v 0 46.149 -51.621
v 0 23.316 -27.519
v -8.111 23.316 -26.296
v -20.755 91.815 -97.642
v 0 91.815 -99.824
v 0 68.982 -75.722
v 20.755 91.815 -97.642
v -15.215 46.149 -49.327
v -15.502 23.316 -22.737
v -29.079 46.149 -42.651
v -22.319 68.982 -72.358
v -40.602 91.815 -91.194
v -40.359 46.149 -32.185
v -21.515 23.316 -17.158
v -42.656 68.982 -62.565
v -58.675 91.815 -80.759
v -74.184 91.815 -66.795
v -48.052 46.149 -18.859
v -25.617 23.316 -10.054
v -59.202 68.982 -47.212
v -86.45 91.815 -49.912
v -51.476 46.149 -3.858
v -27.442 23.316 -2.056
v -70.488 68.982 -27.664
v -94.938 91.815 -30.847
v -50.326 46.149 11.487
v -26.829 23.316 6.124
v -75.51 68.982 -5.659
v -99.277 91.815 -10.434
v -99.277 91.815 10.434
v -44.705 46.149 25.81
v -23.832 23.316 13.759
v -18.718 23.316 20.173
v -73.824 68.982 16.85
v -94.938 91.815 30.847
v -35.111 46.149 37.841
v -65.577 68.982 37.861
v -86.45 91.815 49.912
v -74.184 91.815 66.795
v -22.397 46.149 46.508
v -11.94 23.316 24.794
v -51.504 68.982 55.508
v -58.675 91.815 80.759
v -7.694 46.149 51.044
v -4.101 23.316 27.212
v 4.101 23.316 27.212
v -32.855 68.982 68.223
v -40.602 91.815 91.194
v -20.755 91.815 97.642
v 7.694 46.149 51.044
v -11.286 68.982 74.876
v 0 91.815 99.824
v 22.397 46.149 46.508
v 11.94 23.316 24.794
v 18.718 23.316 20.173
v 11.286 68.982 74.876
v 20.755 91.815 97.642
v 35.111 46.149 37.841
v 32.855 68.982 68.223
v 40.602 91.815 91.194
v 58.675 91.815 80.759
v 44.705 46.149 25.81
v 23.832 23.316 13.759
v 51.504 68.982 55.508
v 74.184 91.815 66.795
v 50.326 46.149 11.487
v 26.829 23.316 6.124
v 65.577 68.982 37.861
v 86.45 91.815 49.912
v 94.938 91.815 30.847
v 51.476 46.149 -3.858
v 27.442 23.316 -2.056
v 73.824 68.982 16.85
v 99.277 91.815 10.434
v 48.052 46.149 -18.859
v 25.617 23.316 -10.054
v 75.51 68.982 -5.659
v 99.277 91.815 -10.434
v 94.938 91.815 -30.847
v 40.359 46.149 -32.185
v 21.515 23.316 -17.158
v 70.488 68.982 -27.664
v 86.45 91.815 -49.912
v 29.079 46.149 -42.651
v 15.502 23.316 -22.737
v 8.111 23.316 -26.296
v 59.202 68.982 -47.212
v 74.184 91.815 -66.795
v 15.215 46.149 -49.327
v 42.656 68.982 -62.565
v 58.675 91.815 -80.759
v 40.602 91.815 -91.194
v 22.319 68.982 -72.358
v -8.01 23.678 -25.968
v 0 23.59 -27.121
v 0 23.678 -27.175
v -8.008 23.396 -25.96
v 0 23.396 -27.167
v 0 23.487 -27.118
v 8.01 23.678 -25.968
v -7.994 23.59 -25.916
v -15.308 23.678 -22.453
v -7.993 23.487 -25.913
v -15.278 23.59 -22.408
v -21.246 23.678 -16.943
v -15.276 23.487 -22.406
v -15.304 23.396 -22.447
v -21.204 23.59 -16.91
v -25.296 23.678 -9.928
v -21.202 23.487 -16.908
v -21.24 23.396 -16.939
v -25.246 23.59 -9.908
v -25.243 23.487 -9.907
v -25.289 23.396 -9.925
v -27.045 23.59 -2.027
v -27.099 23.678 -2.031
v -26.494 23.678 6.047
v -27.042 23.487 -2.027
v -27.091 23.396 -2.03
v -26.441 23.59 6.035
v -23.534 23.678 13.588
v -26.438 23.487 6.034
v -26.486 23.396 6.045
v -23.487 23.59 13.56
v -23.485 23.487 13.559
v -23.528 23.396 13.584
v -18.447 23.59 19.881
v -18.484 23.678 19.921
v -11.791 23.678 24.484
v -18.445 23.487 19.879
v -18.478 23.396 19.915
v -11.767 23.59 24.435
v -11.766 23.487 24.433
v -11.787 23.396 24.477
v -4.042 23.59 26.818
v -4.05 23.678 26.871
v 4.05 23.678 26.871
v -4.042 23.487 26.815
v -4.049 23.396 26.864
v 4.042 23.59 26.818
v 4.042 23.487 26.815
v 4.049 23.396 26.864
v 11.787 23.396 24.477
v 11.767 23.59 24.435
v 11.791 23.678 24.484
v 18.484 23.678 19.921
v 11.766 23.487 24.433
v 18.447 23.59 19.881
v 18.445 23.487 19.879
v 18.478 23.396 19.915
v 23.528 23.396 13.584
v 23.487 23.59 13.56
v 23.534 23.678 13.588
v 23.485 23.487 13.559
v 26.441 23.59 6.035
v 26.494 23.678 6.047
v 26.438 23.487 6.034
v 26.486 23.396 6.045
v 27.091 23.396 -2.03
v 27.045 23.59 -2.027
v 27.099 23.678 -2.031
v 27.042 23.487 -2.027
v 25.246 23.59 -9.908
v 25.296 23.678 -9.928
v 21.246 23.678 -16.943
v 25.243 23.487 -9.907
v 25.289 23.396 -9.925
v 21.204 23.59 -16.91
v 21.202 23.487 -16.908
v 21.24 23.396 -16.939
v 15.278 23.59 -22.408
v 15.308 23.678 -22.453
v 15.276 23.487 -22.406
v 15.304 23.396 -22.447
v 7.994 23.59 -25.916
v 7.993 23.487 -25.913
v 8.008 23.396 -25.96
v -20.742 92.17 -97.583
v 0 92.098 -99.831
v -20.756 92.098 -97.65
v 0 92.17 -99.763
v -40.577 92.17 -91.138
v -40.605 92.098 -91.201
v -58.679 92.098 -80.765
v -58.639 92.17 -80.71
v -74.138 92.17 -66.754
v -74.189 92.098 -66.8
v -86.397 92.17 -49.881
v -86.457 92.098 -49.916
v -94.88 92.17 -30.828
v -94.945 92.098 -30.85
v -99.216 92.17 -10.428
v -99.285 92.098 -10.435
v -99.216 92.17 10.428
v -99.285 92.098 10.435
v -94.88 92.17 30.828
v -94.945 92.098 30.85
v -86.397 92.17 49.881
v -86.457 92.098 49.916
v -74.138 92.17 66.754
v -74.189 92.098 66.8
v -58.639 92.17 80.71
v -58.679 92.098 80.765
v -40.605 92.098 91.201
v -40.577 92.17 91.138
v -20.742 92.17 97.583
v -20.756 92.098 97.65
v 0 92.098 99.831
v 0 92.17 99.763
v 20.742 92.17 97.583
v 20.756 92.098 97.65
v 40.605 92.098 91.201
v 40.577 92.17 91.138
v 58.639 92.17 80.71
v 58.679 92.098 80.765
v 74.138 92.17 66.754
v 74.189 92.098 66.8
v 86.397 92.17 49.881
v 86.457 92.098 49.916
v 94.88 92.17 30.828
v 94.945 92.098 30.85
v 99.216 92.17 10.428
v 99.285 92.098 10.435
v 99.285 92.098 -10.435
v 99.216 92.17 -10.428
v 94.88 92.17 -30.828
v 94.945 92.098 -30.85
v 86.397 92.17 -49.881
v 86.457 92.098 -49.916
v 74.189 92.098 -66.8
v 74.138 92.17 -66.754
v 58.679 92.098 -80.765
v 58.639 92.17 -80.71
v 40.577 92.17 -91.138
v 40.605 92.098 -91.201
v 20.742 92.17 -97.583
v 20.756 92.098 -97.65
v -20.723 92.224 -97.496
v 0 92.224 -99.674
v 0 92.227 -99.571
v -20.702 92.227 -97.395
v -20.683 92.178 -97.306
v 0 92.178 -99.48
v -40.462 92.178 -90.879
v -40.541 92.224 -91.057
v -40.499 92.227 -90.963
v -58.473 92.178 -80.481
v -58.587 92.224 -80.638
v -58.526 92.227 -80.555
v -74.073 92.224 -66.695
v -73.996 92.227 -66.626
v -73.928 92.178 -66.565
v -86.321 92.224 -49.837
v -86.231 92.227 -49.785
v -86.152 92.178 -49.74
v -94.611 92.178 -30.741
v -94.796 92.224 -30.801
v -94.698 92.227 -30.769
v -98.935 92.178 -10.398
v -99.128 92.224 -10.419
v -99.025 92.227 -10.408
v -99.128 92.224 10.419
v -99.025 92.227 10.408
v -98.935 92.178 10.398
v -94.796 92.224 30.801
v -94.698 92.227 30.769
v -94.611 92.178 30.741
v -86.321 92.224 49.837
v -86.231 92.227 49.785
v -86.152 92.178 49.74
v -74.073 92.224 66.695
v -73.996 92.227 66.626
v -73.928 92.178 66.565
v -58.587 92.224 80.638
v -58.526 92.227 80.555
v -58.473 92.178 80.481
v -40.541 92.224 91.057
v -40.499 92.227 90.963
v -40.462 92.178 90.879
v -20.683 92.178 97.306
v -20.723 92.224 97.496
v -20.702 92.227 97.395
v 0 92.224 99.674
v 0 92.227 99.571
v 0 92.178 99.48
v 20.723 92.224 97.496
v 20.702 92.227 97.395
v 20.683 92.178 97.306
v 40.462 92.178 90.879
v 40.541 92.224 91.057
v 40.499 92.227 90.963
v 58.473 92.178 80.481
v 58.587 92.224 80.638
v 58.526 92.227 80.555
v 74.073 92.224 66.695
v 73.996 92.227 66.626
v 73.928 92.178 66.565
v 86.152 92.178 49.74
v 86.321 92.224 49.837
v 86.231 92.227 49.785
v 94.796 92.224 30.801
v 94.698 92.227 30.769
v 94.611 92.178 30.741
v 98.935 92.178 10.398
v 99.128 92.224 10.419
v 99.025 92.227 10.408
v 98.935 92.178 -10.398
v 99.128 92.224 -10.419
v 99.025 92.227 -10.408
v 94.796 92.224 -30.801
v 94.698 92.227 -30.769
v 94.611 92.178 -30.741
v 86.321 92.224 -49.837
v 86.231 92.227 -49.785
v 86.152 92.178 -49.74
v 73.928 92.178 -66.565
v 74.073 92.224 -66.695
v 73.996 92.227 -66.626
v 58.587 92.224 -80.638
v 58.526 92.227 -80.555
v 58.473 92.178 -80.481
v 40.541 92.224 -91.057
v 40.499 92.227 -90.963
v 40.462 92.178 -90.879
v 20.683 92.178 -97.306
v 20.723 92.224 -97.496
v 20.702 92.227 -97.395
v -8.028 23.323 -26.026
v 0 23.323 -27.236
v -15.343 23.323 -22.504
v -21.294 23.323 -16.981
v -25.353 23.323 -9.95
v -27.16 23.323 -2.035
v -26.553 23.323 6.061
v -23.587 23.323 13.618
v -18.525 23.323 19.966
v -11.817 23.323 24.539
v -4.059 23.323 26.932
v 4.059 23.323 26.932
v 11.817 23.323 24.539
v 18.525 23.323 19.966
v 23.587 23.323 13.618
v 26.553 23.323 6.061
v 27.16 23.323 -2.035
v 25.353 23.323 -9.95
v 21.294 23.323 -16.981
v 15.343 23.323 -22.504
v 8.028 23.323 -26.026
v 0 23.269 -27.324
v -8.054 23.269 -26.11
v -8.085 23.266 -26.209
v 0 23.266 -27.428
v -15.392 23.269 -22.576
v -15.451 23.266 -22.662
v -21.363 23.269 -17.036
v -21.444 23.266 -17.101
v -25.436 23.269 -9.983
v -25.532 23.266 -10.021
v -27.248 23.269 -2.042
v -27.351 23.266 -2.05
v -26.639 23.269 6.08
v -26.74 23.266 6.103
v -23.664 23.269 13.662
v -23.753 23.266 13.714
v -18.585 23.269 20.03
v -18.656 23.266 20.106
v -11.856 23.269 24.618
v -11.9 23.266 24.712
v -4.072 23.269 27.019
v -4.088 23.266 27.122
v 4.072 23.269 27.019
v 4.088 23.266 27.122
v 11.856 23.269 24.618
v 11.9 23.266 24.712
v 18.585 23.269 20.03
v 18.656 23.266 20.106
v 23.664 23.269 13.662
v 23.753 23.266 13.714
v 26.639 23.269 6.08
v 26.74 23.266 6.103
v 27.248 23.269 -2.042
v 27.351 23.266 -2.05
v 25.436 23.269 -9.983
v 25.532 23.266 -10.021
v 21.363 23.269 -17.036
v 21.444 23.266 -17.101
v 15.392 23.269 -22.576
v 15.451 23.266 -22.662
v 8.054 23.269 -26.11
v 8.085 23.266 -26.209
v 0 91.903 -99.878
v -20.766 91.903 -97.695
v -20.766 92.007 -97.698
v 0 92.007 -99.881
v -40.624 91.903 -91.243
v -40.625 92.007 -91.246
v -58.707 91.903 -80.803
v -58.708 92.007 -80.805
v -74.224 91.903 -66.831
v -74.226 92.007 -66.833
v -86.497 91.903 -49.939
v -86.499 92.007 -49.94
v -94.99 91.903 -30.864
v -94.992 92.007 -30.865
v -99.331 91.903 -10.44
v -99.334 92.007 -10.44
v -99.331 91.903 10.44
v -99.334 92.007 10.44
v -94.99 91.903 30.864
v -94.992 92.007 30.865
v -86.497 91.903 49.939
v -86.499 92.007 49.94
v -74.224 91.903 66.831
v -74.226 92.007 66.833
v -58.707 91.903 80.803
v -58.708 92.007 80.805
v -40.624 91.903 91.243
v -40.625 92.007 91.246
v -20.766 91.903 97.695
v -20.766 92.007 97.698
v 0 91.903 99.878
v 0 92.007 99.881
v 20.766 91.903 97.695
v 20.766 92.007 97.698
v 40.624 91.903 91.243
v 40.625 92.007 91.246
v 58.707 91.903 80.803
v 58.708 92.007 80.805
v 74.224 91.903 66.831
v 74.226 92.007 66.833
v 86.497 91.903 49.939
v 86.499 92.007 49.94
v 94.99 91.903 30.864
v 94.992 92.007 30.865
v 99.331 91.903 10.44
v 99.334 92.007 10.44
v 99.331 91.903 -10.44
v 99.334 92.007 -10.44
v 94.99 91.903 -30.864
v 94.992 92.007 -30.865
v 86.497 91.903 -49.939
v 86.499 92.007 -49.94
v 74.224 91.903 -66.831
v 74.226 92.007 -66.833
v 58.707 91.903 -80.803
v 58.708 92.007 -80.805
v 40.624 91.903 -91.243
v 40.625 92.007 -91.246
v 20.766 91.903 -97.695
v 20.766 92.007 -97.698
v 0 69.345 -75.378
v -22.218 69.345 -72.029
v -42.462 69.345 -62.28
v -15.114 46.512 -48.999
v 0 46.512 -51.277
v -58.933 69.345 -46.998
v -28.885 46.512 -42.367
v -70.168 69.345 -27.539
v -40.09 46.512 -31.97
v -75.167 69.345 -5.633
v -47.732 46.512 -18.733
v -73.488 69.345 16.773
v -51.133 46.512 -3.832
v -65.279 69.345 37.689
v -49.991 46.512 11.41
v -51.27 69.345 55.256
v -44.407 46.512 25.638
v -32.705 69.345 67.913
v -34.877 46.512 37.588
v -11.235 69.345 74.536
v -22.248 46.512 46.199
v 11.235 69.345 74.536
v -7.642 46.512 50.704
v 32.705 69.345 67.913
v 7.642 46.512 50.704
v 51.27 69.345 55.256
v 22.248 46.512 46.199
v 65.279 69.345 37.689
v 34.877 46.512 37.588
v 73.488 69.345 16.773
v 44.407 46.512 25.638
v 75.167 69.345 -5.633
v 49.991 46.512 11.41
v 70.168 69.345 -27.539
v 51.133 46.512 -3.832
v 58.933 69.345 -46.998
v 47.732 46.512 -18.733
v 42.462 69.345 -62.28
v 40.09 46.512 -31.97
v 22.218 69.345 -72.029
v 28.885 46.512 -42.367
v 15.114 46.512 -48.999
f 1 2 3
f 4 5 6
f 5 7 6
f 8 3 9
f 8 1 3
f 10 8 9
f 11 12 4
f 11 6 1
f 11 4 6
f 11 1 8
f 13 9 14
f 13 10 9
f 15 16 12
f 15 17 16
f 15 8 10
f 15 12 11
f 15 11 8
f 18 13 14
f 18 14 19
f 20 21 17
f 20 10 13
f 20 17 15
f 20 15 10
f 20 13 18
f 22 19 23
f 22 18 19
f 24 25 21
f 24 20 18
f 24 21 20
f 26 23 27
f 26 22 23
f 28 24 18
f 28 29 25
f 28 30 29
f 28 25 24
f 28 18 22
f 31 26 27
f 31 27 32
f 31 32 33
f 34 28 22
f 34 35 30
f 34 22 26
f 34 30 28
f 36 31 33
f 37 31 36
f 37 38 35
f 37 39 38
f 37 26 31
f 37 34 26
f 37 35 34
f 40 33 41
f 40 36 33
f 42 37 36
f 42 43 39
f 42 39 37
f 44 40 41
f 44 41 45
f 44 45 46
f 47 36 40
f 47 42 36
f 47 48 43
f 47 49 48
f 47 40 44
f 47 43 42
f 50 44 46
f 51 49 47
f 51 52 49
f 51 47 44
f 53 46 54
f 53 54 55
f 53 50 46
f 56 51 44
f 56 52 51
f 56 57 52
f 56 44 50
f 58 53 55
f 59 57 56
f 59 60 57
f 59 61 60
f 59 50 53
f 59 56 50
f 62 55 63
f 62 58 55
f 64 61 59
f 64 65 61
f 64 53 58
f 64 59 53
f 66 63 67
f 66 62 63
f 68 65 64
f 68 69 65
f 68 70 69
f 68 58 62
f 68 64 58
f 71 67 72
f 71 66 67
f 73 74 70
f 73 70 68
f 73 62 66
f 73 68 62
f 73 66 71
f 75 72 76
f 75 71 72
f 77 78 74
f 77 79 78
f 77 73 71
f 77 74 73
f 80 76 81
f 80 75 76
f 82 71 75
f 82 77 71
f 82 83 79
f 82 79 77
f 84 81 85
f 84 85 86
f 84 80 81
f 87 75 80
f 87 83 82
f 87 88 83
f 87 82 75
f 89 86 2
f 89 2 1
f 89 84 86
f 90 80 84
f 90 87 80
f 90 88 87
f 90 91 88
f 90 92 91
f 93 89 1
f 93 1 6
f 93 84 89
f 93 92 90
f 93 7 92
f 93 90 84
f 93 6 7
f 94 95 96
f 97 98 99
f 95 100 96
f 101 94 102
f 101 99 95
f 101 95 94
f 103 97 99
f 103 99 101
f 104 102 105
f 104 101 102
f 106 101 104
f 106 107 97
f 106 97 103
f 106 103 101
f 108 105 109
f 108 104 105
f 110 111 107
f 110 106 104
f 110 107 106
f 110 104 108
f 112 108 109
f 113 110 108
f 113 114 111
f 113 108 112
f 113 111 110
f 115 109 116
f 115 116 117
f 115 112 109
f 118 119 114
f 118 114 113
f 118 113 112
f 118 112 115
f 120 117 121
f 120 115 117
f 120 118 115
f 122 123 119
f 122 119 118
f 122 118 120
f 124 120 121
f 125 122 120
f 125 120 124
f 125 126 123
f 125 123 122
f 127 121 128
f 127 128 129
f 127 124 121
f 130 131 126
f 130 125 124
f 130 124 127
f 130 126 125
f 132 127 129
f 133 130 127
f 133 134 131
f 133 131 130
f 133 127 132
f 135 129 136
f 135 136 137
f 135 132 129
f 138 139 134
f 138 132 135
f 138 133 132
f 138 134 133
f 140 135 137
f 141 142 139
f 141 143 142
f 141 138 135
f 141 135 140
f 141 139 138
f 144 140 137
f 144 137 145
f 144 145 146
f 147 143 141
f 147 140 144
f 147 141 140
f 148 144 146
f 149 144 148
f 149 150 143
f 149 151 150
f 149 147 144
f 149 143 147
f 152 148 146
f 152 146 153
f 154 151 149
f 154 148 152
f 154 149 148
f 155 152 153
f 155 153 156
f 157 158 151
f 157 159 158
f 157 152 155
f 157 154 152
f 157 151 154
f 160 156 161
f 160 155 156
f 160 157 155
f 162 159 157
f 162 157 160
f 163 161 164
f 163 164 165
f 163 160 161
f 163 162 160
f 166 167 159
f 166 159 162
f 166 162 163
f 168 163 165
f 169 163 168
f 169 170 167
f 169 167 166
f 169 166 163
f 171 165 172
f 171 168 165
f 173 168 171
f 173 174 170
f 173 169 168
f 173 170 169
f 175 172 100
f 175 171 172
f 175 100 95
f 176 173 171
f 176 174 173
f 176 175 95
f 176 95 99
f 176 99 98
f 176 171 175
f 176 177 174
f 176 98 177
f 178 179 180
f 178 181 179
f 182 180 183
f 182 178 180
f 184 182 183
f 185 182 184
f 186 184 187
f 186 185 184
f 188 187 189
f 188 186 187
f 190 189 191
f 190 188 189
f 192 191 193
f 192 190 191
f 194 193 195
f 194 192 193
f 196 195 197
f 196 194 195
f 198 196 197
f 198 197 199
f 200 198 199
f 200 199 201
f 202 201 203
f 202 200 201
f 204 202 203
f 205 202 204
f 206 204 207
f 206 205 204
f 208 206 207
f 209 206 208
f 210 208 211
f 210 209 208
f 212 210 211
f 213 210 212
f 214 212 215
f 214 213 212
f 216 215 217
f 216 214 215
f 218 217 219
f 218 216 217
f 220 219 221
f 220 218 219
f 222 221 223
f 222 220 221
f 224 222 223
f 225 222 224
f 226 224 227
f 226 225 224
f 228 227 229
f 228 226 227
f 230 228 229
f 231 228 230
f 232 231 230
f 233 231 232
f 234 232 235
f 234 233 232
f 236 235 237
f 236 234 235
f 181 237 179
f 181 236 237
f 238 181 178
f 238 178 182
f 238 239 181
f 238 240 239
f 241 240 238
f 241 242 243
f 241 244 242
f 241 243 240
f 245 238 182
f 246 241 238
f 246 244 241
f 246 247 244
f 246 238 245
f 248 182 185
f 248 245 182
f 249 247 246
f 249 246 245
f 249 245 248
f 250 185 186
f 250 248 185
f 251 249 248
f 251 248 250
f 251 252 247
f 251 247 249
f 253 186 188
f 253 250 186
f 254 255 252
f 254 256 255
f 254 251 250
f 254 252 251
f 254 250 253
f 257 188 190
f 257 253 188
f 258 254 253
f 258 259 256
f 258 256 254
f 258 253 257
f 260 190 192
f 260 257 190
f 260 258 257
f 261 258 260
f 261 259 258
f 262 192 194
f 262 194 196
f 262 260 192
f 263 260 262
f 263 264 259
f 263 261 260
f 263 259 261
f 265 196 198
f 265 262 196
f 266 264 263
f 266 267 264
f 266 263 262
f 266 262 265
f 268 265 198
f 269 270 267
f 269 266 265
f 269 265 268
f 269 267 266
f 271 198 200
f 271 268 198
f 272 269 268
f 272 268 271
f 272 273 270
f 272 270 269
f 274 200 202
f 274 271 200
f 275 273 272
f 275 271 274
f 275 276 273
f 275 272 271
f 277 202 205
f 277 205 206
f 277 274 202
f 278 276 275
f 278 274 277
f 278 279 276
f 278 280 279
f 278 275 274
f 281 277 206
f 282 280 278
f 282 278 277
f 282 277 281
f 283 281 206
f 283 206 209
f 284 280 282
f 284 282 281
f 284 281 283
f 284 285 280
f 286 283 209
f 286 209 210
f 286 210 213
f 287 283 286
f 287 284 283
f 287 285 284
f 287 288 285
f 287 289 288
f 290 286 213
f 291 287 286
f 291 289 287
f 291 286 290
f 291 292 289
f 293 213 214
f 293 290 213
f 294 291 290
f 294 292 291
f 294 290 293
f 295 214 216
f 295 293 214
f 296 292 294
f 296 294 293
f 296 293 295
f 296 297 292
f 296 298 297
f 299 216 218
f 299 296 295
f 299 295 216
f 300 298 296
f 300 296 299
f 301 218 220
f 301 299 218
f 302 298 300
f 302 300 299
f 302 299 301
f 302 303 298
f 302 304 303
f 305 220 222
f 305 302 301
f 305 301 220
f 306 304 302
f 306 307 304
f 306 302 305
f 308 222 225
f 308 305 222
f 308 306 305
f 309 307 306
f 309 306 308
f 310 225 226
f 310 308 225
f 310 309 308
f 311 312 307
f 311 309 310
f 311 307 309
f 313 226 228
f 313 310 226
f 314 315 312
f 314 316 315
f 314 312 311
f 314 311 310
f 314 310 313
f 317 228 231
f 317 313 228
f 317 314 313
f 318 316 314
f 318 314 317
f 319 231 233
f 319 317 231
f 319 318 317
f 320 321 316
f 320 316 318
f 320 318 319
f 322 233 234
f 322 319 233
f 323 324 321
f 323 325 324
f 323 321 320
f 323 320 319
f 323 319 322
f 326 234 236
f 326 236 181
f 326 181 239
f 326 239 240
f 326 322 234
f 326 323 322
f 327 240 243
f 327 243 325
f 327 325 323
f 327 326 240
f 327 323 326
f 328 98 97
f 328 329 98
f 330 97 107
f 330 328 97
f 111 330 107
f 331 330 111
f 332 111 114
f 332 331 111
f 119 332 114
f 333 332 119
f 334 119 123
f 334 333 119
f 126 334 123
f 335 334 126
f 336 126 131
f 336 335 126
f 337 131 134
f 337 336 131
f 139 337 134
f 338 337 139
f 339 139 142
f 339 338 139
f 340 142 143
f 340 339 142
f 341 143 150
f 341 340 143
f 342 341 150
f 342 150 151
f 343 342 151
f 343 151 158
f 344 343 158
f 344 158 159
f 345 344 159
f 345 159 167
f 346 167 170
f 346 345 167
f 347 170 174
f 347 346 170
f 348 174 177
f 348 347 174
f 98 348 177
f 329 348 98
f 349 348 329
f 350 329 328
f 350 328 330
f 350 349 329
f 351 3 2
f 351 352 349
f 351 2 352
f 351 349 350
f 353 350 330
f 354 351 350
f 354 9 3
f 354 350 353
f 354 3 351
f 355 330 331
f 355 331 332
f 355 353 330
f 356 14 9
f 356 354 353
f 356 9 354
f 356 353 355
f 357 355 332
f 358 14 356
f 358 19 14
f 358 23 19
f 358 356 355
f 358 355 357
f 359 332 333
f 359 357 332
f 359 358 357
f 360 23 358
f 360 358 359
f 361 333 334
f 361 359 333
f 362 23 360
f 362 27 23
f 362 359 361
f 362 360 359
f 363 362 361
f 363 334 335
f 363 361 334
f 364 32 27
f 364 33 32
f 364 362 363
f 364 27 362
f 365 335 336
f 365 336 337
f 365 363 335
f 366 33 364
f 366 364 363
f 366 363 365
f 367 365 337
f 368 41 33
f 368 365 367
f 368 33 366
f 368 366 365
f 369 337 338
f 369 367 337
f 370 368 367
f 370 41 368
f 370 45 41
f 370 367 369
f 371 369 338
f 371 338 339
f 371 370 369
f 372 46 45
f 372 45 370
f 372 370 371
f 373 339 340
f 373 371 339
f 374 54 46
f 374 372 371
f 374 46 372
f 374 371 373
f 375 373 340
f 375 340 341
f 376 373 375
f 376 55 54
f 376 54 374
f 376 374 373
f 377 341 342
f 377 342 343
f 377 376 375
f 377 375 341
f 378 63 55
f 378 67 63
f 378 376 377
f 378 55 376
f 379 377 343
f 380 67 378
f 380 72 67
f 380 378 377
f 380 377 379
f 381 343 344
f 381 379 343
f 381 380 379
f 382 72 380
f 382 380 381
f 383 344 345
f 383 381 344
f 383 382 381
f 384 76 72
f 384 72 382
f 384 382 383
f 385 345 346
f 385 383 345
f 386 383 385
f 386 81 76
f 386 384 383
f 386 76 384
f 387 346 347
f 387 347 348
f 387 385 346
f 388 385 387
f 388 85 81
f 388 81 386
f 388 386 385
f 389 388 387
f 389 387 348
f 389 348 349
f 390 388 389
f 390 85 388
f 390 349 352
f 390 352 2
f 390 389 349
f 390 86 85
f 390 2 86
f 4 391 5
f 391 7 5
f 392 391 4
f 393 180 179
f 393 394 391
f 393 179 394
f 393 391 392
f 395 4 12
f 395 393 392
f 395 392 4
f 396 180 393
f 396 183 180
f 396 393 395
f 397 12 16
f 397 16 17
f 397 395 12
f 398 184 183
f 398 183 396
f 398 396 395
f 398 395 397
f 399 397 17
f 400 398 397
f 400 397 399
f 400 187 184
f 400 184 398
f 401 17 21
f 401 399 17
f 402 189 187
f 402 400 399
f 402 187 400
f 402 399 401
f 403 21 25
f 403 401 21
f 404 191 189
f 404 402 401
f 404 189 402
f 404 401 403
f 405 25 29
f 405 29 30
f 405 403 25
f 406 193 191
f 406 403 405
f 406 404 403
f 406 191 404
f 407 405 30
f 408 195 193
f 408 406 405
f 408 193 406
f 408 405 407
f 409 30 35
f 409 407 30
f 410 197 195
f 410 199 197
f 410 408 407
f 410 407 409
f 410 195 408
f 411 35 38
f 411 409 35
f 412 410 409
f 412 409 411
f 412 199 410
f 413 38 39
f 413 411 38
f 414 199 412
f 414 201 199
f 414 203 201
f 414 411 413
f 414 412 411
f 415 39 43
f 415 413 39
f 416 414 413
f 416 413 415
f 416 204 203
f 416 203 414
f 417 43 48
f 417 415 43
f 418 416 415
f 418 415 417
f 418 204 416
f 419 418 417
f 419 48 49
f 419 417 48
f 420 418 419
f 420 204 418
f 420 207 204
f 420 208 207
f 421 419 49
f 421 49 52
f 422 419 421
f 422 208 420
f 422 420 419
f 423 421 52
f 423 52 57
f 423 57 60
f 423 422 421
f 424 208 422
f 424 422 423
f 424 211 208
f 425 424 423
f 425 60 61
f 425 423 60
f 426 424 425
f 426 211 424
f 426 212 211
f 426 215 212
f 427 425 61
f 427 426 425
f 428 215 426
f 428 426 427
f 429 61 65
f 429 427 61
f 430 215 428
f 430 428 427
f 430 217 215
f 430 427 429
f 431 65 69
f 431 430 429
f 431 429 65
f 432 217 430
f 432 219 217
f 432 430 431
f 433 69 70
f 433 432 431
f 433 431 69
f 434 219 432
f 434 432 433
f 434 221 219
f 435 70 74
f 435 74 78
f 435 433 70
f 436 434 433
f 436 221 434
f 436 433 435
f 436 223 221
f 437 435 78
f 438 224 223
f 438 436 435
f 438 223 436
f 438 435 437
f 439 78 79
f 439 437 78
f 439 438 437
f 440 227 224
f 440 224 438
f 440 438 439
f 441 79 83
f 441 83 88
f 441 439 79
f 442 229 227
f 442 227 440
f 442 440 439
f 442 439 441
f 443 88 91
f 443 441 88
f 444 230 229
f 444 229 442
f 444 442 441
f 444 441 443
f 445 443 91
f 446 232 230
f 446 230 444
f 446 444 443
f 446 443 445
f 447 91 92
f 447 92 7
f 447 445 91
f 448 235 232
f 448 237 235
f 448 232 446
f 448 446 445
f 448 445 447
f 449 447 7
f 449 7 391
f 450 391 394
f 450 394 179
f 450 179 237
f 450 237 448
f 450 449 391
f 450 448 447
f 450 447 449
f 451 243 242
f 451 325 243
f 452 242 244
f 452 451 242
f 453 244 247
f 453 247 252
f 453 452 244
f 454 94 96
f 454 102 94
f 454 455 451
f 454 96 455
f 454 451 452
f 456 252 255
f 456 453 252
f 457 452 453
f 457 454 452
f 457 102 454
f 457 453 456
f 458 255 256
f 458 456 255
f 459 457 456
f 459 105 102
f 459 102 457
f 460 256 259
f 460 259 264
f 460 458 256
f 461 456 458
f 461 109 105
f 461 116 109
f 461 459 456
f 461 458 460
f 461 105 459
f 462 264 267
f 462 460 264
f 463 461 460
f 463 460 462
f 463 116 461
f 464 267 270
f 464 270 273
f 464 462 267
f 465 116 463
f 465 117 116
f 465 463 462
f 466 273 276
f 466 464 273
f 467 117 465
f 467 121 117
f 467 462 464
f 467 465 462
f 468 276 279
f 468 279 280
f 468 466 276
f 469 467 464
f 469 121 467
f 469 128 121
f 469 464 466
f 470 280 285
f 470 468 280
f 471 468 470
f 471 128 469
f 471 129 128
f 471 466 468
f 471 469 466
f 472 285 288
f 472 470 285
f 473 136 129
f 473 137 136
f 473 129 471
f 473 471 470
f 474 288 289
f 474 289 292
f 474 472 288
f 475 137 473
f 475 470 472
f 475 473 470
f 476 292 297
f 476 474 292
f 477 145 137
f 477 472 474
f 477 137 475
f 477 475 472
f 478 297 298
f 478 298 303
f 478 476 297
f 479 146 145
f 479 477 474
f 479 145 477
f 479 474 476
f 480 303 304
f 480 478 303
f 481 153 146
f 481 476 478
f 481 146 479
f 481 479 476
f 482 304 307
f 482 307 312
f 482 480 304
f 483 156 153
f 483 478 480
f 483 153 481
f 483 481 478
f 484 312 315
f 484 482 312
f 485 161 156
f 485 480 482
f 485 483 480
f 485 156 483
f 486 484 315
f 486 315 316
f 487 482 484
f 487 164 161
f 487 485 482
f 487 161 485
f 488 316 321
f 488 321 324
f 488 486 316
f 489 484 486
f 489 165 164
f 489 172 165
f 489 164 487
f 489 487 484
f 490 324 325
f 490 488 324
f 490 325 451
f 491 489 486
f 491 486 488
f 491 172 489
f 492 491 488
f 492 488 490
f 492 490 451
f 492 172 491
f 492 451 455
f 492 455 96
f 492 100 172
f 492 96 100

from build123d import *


with BuildPart() as part:
    # Эскиз2 → Повернуть1 (revolve)
    with BuildSketch(Plane.XY, mode=Mode.PRIVATE) as revolve_1_sk:
        with BuildLine():
            Line((99.47989222, 92.177858052), (27.175004903, 23.67849112))
            ThreePointArc((27.175004903, 23.67849112), (27.112626839, 23.538704015), (27.167363296, 23.395751653))
            Line((27.167363296, 23.395751653), (27.236137761, 23.323156385))
            ThreePointArc((27.236137761, 23.323156385), (27.375924866, 23.260778321), (27.518877227, 23.315514778))
            Line((27.518877227, 23.315514778), (99.823764544, 91.81488171))
            ThreePointArc((99.823764544, 91.81488171), (99.886142609, 91.954668814), (99.831406152, 92.097621176))
            Line((99.831406152, 92.097621176), (99.762631687, 92.170216445))
            ThreePointArc((99.762631687, 92.170216445), (99.622844582, 92.232594509), (99.47989222, 92.177858052))
        make_face()
    revolve(revolve_1_sk.sketch.rotate(Axis((0, -32.617744242, 0), (0, 1, 0)), 90), axis=Axis((0, -32.617744242, 0), (0, 1, 0)))


solid = part.part
